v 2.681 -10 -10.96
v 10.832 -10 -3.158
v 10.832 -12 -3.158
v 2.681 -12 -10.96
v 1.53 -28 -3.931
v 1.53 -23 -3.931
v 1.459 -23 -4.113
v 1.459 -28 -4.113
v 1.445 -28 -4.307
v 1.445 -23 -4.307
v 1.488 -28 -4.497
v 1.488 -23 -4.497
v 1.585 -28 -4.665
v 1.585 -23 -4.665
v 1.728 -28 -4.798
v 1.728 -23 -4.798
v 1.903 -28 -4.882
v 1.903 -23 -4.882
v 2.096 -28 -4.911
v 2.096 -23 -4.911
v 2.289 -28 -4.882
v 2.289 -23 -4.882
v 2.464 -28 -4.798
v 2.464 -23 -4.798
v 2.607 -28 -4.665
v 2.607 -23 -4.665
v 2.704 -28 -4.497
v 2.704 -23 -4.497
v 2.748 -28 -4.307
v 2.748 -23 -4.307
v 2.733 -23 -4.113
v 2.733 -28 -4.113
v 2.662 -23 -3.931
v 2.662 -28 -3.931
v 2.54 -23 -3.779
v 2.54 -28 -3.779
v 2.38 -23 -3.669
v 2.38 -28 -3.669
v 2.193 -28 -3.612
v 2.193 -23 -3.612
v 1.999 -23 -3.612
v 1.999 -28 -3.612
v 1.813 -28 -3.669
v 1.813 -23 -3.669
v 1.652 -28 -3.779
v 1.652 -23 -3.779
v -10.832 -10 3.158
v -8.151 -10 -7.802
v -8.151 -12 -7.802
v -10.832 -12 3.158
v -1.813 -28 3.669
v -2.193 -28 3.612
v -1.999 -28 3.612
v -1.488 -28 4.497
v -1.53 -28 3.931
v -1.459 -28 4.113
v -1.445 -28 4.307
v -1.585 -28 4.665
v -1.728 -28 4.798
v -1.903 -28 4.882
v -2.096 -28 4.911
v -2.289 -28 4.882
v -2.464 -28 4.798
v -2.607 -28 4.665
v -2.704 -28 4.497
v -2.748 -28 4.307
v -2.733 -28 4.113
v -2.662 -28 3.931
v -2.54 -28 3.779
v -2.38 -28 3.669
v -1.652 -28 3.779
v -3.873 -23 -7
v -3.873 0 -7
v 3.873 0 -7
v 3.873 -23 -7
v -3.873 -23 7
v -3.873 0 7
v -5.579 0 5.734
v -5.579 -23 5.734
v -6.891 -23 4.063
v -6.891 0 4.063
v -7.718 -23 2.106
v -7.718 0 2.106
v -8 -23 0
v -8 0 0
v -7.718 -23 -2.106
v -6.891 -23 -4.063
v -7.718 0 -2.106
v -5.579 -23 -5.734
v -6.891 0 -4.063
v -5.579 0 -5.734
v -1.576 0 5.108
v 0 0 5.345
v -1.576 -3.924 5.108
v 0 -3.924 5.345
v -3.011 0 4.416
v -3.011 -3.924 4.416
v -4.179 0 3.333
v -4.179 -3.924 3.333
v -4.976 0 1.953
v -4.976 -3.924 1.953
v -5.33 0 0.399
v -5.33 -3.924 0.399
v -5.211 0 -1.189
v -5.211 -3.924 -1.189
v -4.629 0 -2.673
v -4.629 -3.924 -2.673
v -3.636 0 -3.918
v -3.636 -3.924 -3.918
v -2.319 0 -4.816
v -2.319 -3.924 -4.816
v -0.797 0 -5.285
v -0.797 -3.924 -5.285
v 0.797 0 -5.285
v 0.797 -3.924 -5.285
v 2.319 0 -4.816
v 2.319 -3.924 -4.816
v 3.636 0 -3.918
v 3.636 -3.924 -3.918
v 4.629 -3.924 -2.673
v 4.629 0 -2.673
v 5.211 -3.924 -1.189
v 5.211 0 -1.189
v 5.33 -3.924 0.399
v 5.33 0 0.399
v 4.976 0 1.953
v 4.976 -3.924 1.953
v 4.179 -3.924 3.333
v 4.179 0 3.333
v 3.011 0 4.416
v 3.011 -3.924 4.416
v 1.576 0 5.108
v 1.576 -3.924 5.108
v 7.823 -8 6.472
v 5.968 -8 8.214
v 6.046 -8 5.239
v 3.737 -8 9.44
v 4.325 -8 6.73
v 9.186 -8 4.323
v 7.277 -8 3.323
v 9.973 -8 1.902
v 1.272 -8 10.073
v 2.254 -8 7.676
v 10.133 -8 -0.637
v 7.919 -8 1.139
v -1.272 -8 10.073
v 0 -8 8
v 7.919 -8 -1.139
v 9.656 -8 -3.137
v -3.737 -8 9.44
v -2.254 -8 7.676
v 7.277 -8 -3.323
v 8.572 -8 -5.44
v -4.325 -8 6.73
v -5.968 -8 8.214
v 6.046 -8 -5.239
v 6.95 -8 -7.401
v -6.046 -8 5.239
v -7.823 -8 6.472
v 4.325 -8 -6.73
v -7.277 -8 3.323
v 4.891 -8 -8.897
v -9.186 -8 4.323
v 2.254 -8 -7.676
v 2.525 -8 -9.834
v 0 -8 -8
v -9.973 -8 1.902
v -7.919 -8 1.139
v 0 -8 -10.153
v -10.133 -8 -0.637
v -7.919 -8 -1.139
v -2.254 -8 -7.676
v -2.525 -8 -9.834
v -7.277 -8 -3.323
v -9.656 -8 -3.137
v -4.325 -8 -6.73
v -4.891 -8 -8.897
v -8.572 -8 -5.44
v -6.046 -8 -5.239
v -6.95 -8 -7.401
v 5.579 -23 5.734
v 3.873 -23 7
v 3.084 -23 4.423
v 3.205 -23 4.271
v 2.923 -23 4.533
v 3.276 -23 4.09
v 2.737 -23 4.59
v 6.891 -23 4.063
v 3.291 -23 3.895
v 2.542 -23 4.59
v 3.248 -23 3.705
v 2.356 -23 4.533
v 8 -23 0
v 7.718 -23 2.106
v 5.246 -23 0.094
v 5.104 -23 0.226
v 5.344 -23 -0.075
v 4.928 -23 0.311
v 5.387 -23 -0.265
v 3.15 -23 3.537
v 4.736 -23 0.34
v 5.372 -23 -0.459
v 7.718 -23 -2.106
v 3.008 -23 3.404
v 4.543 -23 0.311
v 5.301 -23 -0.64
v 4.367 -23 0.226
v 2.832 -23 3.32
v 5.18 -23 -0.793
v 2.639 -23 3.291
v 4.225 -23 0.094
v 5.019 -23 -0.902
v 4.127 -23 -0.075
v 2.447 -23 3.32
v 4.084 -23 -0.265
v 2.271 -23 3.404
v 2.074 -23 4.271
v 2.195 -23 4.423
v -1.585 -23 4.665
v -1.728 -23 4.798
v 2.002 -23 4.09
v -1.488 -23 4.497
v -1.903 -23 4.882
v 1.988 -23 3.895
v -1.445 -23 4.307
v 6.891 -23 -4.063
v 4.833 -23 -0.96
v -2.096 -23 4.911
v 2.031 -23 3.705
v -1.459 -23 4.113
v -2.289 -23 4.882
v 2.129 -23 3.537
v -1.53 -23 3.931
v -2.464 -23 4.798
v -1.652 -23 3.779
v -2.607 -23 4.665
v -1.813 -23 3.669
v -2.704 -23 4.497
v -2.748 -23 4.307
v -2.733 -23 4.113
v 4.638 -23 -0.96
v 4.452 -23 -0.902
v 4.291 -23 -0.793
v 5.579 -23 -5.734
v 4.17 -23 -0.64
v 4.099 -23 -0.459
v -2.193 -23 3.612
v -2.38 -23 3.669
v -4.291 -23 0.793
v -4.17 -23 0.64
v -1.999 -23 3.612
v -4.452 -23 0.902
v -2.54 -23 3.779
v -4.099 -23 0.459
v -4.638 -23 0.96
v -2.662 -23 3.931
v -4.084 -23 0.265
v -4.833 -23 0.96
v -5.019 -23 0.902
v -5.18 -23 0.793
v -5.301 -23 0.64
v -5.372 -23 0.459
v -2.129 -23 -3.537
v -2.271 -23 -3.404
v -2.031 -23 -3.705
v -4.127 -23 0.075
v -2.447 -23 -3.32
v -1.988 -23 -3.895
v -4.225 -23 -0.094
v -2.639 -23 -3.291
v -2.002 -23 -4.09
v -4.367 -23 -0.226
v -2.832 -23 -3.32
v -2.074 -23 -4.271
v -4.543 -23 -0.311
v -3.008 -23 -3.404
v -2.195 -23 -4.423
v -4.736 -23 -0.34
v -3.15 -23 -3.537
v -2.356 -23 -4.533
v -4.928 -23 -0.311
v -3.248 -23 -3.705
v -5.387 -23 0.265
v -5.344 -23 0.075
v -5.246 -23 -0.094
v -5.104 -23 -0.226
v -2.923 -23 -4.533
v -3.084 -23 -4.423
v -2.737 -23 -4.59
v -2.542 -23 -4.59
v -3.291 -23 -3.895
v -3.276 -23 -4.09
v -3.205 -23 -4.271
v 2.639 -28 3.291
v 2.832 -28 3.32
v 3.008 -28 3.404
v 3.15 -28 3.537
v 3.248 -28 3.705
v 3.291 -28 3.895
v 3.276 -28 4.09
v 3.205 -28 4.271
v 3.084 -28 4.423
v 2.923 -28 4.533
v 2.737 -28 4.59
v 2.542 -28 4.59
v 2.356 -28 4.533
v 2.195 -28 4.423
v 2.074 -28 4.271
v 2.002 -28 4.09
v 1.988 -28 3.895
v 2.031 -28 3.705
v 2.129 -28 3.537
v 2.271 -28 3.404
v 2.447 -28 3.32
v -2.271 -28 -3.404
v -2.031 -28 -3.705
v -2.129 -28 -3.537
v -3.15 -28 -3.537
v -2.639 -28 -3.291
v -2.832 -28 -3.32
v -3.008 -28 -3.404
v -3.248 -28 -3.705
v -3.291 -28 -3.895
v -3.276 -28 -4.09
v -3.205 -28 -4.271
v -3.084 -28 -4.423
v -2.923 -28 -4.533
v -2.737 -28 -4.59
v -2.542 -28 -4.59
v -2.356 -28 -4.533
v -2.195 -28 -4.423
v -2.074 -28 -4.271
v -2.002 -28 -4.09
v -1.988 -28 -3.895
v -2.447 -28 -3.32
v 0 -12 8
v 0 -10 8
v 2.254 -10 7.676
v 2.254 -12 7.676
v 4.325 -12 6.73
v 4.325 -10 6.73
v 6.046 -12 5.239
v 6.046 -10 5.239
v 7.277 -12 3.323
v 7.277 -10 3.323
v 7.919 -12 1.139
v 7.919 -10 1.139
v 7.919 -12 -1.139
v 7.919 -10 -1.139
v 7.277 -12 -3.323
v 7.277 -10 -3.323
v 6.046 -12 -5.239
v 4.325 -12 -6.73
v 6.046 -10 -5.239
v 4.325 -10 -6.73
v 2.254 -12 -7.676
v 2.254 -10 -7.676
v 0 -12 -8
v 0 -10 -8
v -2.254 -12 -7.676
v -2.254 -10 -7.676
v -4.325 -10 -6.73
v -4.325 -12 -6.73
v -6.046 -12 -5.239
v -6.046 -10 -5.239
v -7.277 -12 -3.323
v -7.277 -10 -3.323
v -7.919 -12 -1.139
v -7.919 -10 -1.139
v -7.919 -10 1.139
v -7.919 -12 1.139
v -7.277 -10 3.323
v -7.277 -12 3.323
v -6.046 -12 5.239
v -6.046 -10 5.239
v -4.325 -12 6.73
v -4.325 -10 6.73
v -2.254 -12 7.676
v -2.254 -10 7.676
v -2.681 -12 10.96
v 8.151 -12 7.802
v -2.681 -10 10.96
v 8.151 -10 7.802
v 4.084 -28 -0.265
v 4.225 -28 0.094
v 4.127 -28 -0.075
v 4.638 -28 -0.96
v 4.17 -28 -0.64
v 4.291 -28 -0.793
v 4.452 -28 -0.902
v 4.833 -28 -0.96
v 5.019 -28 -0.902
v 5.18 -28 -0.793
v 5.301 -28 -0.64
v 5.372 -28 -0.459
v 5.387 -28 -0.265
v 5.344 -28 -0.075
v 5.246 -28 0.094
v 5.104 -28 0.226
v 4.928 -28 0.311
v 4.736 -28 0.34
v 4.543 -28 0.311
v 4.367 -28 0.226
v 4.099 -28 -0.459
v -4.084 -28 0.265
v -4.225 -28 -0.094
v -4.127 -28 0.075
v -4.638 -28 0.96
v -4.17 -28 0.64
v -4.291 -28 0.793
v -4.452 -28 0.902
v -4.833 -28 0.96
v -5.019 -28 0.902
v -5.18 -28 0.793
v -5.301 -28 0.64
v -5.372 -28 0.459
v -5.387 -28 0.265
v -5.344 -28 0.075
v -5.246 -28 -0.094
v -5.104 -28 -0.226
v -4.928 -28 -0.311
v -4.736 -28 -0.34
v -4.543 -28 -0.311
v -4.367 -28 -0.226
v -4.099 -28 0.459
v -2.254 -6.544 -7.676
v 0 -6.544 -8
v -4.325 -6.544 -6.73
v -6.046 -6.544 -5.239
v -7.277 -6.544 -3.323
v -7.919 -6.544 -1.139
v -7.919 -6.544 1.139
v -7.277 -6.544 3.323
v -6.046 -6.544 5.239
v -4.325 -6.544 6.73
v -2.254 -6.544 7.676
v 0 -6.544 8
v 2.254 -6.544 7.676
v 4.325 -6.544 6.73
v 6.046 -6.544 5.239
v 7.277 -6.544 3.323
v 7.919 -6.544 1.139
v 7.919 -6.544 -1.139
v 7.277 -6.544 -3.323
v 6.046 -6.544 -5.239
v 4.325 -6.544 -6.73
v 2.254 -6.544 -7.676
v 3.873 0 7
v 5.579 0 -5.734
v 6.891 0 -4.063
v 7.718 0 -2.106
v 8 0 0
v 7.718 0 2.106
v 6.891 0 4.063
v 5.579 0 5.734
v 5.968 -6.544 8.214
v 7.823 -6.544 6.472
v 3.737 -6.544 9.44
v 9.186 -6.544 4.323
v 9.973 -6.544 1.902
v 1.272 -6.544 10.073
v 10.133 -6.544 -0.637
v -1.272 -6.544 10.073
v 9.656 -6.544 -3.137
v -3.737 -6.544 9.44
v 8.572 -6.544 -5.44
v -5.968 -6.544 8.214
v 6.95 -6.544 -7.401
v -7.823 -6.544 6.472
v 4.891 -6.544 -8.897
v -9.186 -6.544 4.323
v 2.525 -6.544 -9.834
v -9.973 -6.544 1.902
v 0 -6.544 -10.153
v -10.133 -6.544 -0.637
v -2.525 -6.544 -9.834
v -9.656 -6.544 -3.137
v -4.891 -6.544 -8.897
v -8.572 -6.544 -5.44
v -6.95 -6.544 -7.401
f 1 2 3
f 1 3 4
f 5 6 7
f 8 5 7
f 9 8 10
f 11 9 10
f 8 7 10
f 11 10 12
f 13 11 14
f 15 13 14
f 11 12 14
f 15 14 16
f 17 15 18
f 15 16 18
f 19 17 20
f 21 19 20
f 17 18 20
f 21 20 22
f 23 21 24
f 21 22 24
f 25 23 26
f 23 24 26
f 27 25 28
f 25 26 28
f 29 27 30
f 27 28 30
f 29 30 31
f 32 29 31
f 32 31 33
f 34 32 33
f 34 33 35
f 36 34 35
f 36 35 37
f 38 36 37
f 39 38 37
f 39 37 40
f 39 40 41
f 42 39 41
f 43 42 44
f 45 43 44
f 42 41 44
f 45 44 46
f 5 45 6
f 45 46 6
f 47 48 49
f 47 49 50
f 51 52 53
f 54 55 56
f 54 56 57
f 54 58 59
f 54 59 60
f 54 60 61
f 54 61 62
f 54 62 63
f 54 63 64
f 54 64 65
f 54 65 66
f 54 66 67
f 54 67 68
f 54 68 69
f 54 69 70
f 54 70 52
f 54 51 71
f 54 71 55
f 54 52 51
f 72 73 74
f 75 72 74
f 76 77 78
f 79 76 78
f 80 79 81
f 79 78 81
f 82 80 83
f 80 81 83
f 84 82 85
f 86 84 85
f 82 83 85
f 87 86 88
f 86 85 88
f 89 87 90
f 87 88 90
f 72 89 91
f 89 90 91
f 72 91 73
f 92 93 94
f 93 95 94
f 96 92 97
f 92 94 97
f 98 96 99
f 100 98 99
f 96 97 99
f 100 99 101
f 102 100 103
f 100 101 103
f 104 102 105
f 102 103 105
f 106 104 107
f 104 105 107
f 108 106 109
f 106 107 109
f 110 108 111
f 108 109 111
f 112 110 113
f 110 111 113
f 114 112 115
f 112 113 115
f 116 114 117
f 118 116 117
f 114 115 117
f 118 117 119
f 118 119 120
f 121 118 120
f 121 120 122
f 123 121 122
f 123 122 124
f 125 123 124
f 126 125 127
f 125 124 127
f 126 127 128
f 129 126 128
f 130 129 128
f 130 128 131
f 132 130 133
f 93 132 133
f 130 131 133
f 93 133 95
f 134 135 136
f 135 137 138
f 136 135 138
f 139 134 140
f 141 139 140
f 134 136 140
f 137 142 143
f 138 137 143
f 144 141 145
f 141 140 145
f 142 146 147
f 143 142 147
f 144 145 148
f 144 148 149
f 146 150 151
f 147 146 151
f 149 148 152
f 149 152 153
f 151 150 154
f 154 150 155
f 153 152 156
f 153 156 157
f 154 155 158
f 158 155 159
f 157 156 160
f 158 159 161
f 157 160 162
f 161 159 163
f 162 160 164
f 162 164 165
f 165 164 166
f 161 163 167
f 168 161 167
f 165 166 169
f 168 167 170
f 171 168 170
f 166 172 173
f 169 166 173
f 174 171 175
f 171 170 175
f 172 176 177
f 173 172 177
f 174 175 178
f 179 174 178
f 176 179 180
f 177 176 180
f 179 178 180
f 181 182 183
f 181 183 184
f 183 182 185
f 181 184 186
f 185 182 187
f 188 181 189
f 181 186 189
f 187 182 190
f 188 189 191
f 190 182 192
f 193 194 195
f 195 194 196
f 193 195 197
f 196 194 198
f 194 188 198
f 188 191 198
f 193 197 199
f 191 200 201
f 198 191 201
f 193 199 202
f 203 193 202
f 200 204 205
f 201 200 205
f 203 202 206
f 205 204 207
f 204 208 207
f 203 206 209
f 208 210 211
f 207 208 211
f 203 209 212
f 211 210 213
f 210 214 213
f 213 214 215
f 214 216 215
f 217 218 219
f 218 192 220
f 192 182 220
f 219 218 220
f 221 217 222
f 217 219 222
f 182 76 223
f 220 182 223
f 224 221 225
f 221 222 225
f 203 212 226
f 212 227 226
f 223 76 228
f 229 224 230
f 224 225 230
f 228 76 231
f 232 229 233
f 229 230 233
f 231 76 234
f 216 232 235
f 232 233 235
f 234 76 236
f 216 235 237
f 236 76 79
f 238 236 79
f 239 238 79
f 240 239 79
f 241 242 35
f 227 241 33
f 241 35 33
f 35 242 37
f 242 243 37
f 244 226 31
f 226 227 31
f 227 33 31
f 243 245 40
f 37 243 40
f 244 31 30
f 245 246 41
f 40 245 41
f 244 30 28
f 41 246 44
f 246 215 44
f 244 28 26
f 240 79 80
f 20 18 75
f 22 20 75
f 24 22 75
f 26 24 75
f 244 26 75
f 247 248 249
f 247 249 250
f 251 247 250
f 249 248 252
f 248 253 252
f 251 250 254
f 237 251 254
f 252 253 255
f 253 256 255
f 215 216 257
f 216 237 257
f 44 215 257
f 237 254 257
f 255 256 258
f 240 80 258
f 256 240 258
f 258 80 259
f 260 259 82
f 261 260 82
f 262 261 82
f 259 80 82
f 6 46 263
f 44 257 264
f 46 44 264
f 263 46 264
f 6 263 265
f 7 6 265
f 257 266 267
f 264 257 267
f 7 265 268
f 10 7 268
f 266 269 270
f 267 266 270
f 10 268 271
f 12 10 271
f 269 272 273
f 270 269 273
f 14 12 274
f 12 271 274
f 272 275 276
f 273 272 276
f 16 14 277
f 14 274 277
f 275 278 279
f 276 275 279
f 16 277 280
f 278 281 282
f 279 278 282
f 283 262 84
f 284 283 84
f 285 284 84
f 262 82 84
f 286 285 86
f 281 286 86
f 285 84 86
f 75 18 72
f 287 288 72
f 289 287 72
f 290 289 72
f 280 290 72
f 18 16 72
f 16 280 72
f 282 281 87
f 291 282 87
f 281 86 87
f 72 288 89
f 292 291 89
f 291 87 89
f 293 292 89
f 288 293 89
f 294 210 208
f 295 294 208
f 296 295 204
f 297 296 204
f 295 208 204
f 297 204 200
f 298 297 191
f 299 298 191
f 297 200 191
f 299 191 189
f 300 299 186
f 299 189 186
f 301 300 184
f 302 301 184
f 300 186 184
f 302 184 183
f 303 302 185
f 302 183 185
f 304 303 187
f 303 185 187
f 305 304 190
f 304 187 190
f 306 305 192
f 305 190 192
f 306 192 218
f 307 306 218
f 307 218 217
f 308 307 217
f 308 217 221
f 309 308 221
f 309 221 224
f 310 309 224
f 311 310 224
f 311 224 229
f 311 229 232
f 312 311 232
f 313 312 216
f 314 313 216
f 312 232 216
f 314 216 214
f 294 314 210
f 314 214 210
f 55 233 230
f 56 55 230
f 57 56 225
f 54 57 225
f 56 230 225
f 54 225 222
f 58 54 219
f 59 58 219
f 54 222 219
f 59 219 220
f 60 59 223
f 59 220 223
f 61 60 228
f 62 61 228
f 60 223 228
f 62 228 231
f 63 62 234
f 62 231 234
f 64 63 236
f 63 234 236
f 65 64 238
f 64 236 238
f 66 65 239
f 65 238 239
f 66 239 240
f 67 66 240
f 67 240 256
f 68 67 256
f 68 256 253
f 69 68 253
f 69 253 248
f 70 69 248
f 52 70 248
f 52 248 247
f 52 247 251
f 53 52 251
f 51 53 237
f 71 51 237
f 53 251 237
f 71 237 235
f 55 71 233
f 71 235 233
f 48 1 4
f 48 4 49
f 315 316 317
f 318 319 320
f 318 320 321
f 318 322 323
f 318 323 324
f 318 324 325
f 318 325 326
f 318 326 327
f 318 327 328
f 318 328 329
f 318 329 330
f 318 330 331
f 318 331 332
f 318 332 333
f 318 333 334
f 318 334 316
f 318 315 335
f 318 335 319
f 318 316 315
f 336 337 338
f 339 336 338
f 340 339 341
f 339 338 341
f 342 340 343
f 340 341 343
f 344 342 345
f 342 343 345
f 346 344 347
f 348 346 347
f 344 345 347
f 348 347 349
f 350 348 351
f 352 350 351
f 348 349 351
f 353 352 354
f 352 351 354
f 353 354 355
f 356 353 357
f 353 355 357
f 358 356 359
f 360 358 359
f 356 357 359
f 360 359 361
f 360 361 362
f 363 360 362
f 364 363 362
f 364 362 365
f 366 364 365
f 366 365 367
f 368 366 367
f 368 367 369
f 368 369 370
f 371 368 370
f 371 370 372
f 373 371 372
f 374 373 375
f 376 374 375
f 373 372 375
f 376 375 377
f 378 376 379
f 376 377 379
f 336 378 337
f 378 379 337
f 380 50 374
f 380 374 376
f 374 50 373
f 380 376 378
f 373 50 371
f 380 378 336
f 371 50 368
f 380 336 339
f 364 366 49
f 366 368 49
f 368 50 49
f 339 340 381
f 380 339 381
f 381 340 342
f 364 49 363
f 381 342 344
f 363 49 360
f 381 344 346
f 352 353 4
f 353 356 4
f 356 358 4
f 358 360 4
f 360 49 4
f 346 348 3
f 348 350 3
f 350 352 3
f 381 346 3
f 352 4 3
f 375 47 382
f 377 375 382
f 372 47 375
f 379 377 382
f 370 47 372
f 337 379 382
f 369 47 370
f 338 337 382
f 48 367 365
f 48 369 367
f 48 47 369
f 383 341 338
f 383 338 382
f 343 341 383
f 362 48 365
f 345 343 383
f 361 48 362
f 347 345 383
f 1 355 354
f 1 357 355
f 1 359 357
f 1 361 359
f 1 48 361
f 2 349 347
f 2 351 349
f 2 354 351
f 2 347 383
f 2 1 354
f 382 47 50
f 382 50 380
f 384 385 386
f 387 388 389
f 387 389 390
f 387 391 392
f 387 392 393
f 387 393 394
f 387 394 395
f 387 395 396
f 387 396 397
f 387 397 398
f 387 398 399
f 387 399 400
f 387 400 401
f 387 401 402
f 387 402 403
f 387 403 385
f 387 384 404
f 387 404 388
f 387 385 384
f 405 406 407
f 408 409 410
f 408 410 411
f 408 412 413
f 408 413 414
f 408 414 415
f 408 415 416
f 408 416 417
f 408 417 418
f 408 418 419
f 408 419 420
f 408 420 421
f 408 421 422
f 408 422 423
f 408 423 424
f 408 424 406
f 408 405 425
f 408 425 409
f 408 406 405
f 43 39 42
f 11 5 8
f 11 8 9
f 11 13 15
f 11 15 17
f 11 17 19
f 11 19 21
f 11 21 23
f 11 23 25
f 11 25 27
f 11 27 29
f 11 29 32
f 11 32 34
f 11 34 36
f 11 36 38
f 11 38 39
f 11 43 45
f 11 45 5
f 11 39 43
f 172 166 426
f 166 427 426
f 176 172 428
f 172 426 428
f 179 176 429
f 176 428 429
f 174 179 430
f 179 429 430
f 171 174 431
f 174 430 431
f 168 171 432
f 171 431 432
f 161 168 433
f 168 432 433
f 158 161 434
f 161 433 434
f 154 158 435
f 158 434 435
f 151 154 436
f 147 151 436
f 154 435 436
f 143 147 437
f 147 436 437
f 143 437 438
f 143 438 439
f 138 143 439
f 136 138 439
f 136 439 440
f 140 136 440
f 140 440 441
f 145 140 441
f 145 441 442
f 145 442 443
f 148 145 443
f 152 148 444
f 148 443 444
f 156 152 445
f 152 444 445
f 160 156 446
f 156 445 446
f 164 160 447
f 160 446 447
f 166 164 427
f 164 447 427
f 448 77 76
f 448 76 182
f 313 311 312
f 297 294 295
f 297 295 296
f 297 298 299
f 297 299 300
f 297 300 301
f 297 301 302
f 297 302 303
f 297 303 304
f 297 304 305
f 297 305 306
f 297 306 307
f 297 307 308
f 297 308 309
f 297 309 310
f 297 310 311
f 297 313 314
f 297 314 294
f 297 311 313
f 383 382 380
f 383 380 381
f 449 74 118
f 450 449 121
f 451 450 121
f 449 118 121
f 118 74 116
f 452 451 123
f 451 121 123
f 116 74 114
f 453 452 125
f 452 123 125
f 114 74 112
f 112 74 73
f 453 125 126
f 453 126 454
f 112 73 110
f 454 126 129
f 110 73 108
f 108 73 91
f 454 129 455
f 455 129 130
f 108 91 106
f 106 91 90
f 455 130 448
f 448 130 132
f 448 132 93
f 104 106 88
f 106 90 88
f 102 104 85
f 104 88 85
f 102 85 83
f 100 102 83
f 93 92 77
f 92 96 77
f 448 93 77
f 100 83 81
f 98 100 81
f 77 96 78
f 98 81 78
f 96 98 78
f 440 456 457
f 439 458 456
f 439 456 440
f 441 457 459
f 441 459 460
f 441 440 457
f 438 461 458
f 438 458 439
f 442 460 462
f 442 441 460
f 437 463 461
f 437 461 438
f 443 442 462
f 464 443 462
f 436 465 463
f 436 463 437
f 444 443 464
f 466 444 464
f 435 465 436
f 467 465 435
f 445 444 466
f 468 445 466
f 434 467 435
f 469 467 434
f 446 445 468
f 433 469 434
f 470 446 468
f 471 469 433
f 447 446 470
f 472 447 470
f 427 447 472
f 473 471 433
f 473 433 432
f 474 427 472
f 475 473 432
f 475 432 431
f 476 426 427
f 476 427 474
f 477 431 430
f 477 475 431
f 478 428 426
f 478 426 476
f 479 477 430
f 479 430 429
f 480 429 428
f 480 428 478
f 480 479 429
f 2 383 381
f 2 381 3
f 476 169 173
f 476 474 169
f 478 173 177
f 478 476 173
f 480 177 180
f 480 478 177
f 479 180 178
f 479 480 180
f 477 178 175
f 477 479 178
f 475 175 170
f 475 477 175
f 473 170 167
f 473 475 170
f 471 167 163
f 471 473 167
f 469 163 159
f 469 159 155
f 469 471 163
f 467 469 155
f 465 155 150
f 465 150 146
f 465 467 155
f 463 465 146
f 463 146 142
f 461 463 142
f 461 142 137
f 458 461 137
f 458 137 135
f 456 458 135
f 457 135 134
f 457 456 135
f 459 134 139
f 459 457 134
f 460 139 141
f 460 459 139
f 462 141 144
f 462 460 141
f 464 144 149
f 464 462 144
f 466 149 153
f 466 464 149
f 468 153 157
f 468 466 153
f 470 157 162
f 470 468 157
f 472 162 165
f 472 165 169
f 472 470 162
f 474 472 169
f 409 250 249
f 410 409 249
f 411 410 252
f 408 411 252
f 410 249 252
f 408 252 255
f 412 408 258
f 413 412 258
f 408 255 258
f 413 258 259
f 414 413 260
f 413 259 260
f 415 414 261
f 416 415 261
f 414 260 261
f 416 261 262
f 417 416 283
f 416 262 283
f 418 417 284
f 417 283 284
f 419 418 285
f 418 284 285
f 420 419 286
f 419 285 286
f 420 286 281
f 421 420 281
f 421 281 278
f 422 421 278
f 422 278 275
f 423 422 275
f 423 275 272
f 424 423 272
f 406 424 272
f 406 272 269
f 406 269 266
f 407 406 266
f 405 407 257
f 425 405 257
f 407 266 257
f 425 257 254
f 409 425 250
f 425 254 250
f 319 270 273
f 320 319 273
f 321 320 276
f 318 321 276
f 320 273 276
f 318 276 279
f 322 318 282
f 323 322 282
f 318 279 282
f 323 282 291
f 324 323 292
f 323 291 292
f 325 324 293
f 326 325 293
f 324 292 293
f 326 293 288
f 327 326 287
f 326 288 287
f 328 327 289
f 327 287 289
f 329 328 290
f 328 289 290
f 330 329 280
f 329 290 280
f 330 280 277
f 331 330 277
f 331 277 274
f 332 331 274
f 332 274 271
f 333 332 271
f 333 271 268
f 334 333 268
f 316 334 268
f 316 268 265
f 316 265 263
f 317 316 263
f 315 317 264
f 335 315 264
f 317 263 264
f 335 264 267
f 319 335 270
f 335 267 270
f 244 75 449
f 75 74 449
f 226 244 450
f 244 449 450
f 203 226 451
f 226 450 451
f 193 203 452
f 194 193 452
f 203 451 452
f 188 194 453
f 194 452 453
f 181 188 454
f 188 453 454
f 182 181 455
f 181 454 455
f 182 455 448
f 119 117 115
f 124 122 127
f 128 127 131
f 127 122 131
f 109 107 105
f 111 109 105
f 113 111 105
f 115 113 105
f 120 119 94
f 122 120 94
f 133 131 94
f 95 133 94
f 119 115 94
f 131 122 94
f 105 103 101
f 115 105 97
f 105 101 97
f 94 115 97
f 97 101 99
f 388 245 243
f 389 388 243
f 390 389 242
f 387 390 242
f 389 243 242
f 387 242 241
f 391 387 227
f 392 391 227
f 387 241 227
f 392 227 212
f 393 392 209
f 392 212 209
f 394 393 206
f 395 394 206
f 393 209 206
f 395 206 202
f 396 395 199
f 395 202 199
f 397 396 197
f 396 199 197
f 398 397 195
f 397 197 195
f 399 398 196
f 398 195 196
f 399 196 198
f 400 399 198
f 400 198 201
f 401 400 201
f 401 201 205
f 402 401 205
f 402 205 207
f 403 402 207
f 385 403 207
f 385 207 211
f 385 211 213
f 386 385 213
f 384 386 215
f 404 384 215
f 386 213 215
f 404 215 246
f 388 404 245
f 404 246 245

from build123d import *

# Parameters (mm, degrees)
SKETCH2_W           = 44.390968634
SKETCH2_H           = 30.096733946
SKETCH2_W_2         = 26.63458118
SKETCH2_H_2         = 14
CUT_EXTRUDE1_DEPTH  = 26.632011236
SKETCH3_R           = 0.653357701
BOSS_EXTRUDE1_DEPTH = 5
CIRPATTERN1_COUNT   = 6
SKETCH5_W           = 2.152737125
SKETCH5_H           = 1.455877733
BOSS_EXTRUDE2_START = -10
SKETCH6_R           = 8
BOSS_EXTRUDE2_DEPTH = 2


with BuildPart() as part:
    # Sketch1 → Revolve1 (revolve)
    with BuildSketch(Plane.XY, mode=Mode.PRIVATE) as revolve1_sk:
        Polygon((-8, 0), (-5.345132743, 0), (-5.345132743, -3.924247536), (0, -3.924247536), (0, -23), (-8, -23), align=None)
    revolve(revolve1_sk.sketch.rotate(Axis((0, 0, 0), (0, -1, 0)), 270), axis=Axis((0, 0, 0), (0, -1, 0)))

    # Sketch2 → Cut-Extrude1 (cut, through all)
    with BuildSketch(Plane(origin=(0, 0, 0), x_dir=(1, 0, 0), z_dir=(0, 1, 0))):
        Rectangle(SKETCH2_W, SKETCH2_H)
        Rectangle(SKETCH2_W_2, SKETCH2_H_2, mode=Mode.SUBTRACT)
    extrude(amount=-CUT_EXTRUDE1_DEPTH, mode=Mode.SUBTRACT)

    # Sketch3 → Boss-Extrude1 (add)
    with BuildSketch(Plane.XZ.offset(23)):
        with Locations(Location((2.639463, 3.944197551, 0), (0, 0, 270))):
            Circle(SKETCH3_R)
    boss_extrude1 = extrude(amount=BOSS_EXTRUDE1_DEPTH)

    # CirPattern1: Boss-Extrude1 ×6 about axis
    cirpattern1_axis = Axis((0, 0, 0), (0, 1, 0))
    for i in range(1, CIRPATTERN1_COUNT):
        add(boss_extrude1.rotate(cirpattern1_axis, i * 360 / CIRPATTERN1_COUNT))


with BuildPart() as body_2:
    # Sketch5 → Revolve2 (revolve)
    with BuildSketch(Plane.XY, mode=Mode.PRIVATE) as revolve2_sk:
        with Locations((-9.076368563, -7.272061134)):
            Rectangle(SKETCH5_W, SKETCH5_H)
    revolve(revolve2_sk.sketch.rotate(Axis((0, 0, 0), (0, 1, 0)), 270), axis=Axis((0, 0, 0), (0, 1, 0)))


with BuildPart() as body_3:
    # Sketch6 → Boss-Extrude2 (new body)
    with BuildSketch(Plane(origin=(0, 0, 0), x_dir=(1, 0, 0), z_dir=(0, 1, 0)).offset(BOSS_EXTRUDE2_START)):
        Polygon((10.832217083, 3.158309077), (2.680932648, 10.960129712), (-8.151284436, 7.801820635), (-10.832217083, -3.158309077), (-2.680932648, -10.960129712), (8.151284436, -7.801820635), align=None)
        with Locations(Location((0, 0, 0), (0, 0, 270))):
            Circle(SKETCH6_R, mode=Mode.SUBTRACT)
    extrude(amount=-BOSS_EXTRUDE2_DEPTH)


solid = Compound([part.part, body_2.part, body_3.part])
